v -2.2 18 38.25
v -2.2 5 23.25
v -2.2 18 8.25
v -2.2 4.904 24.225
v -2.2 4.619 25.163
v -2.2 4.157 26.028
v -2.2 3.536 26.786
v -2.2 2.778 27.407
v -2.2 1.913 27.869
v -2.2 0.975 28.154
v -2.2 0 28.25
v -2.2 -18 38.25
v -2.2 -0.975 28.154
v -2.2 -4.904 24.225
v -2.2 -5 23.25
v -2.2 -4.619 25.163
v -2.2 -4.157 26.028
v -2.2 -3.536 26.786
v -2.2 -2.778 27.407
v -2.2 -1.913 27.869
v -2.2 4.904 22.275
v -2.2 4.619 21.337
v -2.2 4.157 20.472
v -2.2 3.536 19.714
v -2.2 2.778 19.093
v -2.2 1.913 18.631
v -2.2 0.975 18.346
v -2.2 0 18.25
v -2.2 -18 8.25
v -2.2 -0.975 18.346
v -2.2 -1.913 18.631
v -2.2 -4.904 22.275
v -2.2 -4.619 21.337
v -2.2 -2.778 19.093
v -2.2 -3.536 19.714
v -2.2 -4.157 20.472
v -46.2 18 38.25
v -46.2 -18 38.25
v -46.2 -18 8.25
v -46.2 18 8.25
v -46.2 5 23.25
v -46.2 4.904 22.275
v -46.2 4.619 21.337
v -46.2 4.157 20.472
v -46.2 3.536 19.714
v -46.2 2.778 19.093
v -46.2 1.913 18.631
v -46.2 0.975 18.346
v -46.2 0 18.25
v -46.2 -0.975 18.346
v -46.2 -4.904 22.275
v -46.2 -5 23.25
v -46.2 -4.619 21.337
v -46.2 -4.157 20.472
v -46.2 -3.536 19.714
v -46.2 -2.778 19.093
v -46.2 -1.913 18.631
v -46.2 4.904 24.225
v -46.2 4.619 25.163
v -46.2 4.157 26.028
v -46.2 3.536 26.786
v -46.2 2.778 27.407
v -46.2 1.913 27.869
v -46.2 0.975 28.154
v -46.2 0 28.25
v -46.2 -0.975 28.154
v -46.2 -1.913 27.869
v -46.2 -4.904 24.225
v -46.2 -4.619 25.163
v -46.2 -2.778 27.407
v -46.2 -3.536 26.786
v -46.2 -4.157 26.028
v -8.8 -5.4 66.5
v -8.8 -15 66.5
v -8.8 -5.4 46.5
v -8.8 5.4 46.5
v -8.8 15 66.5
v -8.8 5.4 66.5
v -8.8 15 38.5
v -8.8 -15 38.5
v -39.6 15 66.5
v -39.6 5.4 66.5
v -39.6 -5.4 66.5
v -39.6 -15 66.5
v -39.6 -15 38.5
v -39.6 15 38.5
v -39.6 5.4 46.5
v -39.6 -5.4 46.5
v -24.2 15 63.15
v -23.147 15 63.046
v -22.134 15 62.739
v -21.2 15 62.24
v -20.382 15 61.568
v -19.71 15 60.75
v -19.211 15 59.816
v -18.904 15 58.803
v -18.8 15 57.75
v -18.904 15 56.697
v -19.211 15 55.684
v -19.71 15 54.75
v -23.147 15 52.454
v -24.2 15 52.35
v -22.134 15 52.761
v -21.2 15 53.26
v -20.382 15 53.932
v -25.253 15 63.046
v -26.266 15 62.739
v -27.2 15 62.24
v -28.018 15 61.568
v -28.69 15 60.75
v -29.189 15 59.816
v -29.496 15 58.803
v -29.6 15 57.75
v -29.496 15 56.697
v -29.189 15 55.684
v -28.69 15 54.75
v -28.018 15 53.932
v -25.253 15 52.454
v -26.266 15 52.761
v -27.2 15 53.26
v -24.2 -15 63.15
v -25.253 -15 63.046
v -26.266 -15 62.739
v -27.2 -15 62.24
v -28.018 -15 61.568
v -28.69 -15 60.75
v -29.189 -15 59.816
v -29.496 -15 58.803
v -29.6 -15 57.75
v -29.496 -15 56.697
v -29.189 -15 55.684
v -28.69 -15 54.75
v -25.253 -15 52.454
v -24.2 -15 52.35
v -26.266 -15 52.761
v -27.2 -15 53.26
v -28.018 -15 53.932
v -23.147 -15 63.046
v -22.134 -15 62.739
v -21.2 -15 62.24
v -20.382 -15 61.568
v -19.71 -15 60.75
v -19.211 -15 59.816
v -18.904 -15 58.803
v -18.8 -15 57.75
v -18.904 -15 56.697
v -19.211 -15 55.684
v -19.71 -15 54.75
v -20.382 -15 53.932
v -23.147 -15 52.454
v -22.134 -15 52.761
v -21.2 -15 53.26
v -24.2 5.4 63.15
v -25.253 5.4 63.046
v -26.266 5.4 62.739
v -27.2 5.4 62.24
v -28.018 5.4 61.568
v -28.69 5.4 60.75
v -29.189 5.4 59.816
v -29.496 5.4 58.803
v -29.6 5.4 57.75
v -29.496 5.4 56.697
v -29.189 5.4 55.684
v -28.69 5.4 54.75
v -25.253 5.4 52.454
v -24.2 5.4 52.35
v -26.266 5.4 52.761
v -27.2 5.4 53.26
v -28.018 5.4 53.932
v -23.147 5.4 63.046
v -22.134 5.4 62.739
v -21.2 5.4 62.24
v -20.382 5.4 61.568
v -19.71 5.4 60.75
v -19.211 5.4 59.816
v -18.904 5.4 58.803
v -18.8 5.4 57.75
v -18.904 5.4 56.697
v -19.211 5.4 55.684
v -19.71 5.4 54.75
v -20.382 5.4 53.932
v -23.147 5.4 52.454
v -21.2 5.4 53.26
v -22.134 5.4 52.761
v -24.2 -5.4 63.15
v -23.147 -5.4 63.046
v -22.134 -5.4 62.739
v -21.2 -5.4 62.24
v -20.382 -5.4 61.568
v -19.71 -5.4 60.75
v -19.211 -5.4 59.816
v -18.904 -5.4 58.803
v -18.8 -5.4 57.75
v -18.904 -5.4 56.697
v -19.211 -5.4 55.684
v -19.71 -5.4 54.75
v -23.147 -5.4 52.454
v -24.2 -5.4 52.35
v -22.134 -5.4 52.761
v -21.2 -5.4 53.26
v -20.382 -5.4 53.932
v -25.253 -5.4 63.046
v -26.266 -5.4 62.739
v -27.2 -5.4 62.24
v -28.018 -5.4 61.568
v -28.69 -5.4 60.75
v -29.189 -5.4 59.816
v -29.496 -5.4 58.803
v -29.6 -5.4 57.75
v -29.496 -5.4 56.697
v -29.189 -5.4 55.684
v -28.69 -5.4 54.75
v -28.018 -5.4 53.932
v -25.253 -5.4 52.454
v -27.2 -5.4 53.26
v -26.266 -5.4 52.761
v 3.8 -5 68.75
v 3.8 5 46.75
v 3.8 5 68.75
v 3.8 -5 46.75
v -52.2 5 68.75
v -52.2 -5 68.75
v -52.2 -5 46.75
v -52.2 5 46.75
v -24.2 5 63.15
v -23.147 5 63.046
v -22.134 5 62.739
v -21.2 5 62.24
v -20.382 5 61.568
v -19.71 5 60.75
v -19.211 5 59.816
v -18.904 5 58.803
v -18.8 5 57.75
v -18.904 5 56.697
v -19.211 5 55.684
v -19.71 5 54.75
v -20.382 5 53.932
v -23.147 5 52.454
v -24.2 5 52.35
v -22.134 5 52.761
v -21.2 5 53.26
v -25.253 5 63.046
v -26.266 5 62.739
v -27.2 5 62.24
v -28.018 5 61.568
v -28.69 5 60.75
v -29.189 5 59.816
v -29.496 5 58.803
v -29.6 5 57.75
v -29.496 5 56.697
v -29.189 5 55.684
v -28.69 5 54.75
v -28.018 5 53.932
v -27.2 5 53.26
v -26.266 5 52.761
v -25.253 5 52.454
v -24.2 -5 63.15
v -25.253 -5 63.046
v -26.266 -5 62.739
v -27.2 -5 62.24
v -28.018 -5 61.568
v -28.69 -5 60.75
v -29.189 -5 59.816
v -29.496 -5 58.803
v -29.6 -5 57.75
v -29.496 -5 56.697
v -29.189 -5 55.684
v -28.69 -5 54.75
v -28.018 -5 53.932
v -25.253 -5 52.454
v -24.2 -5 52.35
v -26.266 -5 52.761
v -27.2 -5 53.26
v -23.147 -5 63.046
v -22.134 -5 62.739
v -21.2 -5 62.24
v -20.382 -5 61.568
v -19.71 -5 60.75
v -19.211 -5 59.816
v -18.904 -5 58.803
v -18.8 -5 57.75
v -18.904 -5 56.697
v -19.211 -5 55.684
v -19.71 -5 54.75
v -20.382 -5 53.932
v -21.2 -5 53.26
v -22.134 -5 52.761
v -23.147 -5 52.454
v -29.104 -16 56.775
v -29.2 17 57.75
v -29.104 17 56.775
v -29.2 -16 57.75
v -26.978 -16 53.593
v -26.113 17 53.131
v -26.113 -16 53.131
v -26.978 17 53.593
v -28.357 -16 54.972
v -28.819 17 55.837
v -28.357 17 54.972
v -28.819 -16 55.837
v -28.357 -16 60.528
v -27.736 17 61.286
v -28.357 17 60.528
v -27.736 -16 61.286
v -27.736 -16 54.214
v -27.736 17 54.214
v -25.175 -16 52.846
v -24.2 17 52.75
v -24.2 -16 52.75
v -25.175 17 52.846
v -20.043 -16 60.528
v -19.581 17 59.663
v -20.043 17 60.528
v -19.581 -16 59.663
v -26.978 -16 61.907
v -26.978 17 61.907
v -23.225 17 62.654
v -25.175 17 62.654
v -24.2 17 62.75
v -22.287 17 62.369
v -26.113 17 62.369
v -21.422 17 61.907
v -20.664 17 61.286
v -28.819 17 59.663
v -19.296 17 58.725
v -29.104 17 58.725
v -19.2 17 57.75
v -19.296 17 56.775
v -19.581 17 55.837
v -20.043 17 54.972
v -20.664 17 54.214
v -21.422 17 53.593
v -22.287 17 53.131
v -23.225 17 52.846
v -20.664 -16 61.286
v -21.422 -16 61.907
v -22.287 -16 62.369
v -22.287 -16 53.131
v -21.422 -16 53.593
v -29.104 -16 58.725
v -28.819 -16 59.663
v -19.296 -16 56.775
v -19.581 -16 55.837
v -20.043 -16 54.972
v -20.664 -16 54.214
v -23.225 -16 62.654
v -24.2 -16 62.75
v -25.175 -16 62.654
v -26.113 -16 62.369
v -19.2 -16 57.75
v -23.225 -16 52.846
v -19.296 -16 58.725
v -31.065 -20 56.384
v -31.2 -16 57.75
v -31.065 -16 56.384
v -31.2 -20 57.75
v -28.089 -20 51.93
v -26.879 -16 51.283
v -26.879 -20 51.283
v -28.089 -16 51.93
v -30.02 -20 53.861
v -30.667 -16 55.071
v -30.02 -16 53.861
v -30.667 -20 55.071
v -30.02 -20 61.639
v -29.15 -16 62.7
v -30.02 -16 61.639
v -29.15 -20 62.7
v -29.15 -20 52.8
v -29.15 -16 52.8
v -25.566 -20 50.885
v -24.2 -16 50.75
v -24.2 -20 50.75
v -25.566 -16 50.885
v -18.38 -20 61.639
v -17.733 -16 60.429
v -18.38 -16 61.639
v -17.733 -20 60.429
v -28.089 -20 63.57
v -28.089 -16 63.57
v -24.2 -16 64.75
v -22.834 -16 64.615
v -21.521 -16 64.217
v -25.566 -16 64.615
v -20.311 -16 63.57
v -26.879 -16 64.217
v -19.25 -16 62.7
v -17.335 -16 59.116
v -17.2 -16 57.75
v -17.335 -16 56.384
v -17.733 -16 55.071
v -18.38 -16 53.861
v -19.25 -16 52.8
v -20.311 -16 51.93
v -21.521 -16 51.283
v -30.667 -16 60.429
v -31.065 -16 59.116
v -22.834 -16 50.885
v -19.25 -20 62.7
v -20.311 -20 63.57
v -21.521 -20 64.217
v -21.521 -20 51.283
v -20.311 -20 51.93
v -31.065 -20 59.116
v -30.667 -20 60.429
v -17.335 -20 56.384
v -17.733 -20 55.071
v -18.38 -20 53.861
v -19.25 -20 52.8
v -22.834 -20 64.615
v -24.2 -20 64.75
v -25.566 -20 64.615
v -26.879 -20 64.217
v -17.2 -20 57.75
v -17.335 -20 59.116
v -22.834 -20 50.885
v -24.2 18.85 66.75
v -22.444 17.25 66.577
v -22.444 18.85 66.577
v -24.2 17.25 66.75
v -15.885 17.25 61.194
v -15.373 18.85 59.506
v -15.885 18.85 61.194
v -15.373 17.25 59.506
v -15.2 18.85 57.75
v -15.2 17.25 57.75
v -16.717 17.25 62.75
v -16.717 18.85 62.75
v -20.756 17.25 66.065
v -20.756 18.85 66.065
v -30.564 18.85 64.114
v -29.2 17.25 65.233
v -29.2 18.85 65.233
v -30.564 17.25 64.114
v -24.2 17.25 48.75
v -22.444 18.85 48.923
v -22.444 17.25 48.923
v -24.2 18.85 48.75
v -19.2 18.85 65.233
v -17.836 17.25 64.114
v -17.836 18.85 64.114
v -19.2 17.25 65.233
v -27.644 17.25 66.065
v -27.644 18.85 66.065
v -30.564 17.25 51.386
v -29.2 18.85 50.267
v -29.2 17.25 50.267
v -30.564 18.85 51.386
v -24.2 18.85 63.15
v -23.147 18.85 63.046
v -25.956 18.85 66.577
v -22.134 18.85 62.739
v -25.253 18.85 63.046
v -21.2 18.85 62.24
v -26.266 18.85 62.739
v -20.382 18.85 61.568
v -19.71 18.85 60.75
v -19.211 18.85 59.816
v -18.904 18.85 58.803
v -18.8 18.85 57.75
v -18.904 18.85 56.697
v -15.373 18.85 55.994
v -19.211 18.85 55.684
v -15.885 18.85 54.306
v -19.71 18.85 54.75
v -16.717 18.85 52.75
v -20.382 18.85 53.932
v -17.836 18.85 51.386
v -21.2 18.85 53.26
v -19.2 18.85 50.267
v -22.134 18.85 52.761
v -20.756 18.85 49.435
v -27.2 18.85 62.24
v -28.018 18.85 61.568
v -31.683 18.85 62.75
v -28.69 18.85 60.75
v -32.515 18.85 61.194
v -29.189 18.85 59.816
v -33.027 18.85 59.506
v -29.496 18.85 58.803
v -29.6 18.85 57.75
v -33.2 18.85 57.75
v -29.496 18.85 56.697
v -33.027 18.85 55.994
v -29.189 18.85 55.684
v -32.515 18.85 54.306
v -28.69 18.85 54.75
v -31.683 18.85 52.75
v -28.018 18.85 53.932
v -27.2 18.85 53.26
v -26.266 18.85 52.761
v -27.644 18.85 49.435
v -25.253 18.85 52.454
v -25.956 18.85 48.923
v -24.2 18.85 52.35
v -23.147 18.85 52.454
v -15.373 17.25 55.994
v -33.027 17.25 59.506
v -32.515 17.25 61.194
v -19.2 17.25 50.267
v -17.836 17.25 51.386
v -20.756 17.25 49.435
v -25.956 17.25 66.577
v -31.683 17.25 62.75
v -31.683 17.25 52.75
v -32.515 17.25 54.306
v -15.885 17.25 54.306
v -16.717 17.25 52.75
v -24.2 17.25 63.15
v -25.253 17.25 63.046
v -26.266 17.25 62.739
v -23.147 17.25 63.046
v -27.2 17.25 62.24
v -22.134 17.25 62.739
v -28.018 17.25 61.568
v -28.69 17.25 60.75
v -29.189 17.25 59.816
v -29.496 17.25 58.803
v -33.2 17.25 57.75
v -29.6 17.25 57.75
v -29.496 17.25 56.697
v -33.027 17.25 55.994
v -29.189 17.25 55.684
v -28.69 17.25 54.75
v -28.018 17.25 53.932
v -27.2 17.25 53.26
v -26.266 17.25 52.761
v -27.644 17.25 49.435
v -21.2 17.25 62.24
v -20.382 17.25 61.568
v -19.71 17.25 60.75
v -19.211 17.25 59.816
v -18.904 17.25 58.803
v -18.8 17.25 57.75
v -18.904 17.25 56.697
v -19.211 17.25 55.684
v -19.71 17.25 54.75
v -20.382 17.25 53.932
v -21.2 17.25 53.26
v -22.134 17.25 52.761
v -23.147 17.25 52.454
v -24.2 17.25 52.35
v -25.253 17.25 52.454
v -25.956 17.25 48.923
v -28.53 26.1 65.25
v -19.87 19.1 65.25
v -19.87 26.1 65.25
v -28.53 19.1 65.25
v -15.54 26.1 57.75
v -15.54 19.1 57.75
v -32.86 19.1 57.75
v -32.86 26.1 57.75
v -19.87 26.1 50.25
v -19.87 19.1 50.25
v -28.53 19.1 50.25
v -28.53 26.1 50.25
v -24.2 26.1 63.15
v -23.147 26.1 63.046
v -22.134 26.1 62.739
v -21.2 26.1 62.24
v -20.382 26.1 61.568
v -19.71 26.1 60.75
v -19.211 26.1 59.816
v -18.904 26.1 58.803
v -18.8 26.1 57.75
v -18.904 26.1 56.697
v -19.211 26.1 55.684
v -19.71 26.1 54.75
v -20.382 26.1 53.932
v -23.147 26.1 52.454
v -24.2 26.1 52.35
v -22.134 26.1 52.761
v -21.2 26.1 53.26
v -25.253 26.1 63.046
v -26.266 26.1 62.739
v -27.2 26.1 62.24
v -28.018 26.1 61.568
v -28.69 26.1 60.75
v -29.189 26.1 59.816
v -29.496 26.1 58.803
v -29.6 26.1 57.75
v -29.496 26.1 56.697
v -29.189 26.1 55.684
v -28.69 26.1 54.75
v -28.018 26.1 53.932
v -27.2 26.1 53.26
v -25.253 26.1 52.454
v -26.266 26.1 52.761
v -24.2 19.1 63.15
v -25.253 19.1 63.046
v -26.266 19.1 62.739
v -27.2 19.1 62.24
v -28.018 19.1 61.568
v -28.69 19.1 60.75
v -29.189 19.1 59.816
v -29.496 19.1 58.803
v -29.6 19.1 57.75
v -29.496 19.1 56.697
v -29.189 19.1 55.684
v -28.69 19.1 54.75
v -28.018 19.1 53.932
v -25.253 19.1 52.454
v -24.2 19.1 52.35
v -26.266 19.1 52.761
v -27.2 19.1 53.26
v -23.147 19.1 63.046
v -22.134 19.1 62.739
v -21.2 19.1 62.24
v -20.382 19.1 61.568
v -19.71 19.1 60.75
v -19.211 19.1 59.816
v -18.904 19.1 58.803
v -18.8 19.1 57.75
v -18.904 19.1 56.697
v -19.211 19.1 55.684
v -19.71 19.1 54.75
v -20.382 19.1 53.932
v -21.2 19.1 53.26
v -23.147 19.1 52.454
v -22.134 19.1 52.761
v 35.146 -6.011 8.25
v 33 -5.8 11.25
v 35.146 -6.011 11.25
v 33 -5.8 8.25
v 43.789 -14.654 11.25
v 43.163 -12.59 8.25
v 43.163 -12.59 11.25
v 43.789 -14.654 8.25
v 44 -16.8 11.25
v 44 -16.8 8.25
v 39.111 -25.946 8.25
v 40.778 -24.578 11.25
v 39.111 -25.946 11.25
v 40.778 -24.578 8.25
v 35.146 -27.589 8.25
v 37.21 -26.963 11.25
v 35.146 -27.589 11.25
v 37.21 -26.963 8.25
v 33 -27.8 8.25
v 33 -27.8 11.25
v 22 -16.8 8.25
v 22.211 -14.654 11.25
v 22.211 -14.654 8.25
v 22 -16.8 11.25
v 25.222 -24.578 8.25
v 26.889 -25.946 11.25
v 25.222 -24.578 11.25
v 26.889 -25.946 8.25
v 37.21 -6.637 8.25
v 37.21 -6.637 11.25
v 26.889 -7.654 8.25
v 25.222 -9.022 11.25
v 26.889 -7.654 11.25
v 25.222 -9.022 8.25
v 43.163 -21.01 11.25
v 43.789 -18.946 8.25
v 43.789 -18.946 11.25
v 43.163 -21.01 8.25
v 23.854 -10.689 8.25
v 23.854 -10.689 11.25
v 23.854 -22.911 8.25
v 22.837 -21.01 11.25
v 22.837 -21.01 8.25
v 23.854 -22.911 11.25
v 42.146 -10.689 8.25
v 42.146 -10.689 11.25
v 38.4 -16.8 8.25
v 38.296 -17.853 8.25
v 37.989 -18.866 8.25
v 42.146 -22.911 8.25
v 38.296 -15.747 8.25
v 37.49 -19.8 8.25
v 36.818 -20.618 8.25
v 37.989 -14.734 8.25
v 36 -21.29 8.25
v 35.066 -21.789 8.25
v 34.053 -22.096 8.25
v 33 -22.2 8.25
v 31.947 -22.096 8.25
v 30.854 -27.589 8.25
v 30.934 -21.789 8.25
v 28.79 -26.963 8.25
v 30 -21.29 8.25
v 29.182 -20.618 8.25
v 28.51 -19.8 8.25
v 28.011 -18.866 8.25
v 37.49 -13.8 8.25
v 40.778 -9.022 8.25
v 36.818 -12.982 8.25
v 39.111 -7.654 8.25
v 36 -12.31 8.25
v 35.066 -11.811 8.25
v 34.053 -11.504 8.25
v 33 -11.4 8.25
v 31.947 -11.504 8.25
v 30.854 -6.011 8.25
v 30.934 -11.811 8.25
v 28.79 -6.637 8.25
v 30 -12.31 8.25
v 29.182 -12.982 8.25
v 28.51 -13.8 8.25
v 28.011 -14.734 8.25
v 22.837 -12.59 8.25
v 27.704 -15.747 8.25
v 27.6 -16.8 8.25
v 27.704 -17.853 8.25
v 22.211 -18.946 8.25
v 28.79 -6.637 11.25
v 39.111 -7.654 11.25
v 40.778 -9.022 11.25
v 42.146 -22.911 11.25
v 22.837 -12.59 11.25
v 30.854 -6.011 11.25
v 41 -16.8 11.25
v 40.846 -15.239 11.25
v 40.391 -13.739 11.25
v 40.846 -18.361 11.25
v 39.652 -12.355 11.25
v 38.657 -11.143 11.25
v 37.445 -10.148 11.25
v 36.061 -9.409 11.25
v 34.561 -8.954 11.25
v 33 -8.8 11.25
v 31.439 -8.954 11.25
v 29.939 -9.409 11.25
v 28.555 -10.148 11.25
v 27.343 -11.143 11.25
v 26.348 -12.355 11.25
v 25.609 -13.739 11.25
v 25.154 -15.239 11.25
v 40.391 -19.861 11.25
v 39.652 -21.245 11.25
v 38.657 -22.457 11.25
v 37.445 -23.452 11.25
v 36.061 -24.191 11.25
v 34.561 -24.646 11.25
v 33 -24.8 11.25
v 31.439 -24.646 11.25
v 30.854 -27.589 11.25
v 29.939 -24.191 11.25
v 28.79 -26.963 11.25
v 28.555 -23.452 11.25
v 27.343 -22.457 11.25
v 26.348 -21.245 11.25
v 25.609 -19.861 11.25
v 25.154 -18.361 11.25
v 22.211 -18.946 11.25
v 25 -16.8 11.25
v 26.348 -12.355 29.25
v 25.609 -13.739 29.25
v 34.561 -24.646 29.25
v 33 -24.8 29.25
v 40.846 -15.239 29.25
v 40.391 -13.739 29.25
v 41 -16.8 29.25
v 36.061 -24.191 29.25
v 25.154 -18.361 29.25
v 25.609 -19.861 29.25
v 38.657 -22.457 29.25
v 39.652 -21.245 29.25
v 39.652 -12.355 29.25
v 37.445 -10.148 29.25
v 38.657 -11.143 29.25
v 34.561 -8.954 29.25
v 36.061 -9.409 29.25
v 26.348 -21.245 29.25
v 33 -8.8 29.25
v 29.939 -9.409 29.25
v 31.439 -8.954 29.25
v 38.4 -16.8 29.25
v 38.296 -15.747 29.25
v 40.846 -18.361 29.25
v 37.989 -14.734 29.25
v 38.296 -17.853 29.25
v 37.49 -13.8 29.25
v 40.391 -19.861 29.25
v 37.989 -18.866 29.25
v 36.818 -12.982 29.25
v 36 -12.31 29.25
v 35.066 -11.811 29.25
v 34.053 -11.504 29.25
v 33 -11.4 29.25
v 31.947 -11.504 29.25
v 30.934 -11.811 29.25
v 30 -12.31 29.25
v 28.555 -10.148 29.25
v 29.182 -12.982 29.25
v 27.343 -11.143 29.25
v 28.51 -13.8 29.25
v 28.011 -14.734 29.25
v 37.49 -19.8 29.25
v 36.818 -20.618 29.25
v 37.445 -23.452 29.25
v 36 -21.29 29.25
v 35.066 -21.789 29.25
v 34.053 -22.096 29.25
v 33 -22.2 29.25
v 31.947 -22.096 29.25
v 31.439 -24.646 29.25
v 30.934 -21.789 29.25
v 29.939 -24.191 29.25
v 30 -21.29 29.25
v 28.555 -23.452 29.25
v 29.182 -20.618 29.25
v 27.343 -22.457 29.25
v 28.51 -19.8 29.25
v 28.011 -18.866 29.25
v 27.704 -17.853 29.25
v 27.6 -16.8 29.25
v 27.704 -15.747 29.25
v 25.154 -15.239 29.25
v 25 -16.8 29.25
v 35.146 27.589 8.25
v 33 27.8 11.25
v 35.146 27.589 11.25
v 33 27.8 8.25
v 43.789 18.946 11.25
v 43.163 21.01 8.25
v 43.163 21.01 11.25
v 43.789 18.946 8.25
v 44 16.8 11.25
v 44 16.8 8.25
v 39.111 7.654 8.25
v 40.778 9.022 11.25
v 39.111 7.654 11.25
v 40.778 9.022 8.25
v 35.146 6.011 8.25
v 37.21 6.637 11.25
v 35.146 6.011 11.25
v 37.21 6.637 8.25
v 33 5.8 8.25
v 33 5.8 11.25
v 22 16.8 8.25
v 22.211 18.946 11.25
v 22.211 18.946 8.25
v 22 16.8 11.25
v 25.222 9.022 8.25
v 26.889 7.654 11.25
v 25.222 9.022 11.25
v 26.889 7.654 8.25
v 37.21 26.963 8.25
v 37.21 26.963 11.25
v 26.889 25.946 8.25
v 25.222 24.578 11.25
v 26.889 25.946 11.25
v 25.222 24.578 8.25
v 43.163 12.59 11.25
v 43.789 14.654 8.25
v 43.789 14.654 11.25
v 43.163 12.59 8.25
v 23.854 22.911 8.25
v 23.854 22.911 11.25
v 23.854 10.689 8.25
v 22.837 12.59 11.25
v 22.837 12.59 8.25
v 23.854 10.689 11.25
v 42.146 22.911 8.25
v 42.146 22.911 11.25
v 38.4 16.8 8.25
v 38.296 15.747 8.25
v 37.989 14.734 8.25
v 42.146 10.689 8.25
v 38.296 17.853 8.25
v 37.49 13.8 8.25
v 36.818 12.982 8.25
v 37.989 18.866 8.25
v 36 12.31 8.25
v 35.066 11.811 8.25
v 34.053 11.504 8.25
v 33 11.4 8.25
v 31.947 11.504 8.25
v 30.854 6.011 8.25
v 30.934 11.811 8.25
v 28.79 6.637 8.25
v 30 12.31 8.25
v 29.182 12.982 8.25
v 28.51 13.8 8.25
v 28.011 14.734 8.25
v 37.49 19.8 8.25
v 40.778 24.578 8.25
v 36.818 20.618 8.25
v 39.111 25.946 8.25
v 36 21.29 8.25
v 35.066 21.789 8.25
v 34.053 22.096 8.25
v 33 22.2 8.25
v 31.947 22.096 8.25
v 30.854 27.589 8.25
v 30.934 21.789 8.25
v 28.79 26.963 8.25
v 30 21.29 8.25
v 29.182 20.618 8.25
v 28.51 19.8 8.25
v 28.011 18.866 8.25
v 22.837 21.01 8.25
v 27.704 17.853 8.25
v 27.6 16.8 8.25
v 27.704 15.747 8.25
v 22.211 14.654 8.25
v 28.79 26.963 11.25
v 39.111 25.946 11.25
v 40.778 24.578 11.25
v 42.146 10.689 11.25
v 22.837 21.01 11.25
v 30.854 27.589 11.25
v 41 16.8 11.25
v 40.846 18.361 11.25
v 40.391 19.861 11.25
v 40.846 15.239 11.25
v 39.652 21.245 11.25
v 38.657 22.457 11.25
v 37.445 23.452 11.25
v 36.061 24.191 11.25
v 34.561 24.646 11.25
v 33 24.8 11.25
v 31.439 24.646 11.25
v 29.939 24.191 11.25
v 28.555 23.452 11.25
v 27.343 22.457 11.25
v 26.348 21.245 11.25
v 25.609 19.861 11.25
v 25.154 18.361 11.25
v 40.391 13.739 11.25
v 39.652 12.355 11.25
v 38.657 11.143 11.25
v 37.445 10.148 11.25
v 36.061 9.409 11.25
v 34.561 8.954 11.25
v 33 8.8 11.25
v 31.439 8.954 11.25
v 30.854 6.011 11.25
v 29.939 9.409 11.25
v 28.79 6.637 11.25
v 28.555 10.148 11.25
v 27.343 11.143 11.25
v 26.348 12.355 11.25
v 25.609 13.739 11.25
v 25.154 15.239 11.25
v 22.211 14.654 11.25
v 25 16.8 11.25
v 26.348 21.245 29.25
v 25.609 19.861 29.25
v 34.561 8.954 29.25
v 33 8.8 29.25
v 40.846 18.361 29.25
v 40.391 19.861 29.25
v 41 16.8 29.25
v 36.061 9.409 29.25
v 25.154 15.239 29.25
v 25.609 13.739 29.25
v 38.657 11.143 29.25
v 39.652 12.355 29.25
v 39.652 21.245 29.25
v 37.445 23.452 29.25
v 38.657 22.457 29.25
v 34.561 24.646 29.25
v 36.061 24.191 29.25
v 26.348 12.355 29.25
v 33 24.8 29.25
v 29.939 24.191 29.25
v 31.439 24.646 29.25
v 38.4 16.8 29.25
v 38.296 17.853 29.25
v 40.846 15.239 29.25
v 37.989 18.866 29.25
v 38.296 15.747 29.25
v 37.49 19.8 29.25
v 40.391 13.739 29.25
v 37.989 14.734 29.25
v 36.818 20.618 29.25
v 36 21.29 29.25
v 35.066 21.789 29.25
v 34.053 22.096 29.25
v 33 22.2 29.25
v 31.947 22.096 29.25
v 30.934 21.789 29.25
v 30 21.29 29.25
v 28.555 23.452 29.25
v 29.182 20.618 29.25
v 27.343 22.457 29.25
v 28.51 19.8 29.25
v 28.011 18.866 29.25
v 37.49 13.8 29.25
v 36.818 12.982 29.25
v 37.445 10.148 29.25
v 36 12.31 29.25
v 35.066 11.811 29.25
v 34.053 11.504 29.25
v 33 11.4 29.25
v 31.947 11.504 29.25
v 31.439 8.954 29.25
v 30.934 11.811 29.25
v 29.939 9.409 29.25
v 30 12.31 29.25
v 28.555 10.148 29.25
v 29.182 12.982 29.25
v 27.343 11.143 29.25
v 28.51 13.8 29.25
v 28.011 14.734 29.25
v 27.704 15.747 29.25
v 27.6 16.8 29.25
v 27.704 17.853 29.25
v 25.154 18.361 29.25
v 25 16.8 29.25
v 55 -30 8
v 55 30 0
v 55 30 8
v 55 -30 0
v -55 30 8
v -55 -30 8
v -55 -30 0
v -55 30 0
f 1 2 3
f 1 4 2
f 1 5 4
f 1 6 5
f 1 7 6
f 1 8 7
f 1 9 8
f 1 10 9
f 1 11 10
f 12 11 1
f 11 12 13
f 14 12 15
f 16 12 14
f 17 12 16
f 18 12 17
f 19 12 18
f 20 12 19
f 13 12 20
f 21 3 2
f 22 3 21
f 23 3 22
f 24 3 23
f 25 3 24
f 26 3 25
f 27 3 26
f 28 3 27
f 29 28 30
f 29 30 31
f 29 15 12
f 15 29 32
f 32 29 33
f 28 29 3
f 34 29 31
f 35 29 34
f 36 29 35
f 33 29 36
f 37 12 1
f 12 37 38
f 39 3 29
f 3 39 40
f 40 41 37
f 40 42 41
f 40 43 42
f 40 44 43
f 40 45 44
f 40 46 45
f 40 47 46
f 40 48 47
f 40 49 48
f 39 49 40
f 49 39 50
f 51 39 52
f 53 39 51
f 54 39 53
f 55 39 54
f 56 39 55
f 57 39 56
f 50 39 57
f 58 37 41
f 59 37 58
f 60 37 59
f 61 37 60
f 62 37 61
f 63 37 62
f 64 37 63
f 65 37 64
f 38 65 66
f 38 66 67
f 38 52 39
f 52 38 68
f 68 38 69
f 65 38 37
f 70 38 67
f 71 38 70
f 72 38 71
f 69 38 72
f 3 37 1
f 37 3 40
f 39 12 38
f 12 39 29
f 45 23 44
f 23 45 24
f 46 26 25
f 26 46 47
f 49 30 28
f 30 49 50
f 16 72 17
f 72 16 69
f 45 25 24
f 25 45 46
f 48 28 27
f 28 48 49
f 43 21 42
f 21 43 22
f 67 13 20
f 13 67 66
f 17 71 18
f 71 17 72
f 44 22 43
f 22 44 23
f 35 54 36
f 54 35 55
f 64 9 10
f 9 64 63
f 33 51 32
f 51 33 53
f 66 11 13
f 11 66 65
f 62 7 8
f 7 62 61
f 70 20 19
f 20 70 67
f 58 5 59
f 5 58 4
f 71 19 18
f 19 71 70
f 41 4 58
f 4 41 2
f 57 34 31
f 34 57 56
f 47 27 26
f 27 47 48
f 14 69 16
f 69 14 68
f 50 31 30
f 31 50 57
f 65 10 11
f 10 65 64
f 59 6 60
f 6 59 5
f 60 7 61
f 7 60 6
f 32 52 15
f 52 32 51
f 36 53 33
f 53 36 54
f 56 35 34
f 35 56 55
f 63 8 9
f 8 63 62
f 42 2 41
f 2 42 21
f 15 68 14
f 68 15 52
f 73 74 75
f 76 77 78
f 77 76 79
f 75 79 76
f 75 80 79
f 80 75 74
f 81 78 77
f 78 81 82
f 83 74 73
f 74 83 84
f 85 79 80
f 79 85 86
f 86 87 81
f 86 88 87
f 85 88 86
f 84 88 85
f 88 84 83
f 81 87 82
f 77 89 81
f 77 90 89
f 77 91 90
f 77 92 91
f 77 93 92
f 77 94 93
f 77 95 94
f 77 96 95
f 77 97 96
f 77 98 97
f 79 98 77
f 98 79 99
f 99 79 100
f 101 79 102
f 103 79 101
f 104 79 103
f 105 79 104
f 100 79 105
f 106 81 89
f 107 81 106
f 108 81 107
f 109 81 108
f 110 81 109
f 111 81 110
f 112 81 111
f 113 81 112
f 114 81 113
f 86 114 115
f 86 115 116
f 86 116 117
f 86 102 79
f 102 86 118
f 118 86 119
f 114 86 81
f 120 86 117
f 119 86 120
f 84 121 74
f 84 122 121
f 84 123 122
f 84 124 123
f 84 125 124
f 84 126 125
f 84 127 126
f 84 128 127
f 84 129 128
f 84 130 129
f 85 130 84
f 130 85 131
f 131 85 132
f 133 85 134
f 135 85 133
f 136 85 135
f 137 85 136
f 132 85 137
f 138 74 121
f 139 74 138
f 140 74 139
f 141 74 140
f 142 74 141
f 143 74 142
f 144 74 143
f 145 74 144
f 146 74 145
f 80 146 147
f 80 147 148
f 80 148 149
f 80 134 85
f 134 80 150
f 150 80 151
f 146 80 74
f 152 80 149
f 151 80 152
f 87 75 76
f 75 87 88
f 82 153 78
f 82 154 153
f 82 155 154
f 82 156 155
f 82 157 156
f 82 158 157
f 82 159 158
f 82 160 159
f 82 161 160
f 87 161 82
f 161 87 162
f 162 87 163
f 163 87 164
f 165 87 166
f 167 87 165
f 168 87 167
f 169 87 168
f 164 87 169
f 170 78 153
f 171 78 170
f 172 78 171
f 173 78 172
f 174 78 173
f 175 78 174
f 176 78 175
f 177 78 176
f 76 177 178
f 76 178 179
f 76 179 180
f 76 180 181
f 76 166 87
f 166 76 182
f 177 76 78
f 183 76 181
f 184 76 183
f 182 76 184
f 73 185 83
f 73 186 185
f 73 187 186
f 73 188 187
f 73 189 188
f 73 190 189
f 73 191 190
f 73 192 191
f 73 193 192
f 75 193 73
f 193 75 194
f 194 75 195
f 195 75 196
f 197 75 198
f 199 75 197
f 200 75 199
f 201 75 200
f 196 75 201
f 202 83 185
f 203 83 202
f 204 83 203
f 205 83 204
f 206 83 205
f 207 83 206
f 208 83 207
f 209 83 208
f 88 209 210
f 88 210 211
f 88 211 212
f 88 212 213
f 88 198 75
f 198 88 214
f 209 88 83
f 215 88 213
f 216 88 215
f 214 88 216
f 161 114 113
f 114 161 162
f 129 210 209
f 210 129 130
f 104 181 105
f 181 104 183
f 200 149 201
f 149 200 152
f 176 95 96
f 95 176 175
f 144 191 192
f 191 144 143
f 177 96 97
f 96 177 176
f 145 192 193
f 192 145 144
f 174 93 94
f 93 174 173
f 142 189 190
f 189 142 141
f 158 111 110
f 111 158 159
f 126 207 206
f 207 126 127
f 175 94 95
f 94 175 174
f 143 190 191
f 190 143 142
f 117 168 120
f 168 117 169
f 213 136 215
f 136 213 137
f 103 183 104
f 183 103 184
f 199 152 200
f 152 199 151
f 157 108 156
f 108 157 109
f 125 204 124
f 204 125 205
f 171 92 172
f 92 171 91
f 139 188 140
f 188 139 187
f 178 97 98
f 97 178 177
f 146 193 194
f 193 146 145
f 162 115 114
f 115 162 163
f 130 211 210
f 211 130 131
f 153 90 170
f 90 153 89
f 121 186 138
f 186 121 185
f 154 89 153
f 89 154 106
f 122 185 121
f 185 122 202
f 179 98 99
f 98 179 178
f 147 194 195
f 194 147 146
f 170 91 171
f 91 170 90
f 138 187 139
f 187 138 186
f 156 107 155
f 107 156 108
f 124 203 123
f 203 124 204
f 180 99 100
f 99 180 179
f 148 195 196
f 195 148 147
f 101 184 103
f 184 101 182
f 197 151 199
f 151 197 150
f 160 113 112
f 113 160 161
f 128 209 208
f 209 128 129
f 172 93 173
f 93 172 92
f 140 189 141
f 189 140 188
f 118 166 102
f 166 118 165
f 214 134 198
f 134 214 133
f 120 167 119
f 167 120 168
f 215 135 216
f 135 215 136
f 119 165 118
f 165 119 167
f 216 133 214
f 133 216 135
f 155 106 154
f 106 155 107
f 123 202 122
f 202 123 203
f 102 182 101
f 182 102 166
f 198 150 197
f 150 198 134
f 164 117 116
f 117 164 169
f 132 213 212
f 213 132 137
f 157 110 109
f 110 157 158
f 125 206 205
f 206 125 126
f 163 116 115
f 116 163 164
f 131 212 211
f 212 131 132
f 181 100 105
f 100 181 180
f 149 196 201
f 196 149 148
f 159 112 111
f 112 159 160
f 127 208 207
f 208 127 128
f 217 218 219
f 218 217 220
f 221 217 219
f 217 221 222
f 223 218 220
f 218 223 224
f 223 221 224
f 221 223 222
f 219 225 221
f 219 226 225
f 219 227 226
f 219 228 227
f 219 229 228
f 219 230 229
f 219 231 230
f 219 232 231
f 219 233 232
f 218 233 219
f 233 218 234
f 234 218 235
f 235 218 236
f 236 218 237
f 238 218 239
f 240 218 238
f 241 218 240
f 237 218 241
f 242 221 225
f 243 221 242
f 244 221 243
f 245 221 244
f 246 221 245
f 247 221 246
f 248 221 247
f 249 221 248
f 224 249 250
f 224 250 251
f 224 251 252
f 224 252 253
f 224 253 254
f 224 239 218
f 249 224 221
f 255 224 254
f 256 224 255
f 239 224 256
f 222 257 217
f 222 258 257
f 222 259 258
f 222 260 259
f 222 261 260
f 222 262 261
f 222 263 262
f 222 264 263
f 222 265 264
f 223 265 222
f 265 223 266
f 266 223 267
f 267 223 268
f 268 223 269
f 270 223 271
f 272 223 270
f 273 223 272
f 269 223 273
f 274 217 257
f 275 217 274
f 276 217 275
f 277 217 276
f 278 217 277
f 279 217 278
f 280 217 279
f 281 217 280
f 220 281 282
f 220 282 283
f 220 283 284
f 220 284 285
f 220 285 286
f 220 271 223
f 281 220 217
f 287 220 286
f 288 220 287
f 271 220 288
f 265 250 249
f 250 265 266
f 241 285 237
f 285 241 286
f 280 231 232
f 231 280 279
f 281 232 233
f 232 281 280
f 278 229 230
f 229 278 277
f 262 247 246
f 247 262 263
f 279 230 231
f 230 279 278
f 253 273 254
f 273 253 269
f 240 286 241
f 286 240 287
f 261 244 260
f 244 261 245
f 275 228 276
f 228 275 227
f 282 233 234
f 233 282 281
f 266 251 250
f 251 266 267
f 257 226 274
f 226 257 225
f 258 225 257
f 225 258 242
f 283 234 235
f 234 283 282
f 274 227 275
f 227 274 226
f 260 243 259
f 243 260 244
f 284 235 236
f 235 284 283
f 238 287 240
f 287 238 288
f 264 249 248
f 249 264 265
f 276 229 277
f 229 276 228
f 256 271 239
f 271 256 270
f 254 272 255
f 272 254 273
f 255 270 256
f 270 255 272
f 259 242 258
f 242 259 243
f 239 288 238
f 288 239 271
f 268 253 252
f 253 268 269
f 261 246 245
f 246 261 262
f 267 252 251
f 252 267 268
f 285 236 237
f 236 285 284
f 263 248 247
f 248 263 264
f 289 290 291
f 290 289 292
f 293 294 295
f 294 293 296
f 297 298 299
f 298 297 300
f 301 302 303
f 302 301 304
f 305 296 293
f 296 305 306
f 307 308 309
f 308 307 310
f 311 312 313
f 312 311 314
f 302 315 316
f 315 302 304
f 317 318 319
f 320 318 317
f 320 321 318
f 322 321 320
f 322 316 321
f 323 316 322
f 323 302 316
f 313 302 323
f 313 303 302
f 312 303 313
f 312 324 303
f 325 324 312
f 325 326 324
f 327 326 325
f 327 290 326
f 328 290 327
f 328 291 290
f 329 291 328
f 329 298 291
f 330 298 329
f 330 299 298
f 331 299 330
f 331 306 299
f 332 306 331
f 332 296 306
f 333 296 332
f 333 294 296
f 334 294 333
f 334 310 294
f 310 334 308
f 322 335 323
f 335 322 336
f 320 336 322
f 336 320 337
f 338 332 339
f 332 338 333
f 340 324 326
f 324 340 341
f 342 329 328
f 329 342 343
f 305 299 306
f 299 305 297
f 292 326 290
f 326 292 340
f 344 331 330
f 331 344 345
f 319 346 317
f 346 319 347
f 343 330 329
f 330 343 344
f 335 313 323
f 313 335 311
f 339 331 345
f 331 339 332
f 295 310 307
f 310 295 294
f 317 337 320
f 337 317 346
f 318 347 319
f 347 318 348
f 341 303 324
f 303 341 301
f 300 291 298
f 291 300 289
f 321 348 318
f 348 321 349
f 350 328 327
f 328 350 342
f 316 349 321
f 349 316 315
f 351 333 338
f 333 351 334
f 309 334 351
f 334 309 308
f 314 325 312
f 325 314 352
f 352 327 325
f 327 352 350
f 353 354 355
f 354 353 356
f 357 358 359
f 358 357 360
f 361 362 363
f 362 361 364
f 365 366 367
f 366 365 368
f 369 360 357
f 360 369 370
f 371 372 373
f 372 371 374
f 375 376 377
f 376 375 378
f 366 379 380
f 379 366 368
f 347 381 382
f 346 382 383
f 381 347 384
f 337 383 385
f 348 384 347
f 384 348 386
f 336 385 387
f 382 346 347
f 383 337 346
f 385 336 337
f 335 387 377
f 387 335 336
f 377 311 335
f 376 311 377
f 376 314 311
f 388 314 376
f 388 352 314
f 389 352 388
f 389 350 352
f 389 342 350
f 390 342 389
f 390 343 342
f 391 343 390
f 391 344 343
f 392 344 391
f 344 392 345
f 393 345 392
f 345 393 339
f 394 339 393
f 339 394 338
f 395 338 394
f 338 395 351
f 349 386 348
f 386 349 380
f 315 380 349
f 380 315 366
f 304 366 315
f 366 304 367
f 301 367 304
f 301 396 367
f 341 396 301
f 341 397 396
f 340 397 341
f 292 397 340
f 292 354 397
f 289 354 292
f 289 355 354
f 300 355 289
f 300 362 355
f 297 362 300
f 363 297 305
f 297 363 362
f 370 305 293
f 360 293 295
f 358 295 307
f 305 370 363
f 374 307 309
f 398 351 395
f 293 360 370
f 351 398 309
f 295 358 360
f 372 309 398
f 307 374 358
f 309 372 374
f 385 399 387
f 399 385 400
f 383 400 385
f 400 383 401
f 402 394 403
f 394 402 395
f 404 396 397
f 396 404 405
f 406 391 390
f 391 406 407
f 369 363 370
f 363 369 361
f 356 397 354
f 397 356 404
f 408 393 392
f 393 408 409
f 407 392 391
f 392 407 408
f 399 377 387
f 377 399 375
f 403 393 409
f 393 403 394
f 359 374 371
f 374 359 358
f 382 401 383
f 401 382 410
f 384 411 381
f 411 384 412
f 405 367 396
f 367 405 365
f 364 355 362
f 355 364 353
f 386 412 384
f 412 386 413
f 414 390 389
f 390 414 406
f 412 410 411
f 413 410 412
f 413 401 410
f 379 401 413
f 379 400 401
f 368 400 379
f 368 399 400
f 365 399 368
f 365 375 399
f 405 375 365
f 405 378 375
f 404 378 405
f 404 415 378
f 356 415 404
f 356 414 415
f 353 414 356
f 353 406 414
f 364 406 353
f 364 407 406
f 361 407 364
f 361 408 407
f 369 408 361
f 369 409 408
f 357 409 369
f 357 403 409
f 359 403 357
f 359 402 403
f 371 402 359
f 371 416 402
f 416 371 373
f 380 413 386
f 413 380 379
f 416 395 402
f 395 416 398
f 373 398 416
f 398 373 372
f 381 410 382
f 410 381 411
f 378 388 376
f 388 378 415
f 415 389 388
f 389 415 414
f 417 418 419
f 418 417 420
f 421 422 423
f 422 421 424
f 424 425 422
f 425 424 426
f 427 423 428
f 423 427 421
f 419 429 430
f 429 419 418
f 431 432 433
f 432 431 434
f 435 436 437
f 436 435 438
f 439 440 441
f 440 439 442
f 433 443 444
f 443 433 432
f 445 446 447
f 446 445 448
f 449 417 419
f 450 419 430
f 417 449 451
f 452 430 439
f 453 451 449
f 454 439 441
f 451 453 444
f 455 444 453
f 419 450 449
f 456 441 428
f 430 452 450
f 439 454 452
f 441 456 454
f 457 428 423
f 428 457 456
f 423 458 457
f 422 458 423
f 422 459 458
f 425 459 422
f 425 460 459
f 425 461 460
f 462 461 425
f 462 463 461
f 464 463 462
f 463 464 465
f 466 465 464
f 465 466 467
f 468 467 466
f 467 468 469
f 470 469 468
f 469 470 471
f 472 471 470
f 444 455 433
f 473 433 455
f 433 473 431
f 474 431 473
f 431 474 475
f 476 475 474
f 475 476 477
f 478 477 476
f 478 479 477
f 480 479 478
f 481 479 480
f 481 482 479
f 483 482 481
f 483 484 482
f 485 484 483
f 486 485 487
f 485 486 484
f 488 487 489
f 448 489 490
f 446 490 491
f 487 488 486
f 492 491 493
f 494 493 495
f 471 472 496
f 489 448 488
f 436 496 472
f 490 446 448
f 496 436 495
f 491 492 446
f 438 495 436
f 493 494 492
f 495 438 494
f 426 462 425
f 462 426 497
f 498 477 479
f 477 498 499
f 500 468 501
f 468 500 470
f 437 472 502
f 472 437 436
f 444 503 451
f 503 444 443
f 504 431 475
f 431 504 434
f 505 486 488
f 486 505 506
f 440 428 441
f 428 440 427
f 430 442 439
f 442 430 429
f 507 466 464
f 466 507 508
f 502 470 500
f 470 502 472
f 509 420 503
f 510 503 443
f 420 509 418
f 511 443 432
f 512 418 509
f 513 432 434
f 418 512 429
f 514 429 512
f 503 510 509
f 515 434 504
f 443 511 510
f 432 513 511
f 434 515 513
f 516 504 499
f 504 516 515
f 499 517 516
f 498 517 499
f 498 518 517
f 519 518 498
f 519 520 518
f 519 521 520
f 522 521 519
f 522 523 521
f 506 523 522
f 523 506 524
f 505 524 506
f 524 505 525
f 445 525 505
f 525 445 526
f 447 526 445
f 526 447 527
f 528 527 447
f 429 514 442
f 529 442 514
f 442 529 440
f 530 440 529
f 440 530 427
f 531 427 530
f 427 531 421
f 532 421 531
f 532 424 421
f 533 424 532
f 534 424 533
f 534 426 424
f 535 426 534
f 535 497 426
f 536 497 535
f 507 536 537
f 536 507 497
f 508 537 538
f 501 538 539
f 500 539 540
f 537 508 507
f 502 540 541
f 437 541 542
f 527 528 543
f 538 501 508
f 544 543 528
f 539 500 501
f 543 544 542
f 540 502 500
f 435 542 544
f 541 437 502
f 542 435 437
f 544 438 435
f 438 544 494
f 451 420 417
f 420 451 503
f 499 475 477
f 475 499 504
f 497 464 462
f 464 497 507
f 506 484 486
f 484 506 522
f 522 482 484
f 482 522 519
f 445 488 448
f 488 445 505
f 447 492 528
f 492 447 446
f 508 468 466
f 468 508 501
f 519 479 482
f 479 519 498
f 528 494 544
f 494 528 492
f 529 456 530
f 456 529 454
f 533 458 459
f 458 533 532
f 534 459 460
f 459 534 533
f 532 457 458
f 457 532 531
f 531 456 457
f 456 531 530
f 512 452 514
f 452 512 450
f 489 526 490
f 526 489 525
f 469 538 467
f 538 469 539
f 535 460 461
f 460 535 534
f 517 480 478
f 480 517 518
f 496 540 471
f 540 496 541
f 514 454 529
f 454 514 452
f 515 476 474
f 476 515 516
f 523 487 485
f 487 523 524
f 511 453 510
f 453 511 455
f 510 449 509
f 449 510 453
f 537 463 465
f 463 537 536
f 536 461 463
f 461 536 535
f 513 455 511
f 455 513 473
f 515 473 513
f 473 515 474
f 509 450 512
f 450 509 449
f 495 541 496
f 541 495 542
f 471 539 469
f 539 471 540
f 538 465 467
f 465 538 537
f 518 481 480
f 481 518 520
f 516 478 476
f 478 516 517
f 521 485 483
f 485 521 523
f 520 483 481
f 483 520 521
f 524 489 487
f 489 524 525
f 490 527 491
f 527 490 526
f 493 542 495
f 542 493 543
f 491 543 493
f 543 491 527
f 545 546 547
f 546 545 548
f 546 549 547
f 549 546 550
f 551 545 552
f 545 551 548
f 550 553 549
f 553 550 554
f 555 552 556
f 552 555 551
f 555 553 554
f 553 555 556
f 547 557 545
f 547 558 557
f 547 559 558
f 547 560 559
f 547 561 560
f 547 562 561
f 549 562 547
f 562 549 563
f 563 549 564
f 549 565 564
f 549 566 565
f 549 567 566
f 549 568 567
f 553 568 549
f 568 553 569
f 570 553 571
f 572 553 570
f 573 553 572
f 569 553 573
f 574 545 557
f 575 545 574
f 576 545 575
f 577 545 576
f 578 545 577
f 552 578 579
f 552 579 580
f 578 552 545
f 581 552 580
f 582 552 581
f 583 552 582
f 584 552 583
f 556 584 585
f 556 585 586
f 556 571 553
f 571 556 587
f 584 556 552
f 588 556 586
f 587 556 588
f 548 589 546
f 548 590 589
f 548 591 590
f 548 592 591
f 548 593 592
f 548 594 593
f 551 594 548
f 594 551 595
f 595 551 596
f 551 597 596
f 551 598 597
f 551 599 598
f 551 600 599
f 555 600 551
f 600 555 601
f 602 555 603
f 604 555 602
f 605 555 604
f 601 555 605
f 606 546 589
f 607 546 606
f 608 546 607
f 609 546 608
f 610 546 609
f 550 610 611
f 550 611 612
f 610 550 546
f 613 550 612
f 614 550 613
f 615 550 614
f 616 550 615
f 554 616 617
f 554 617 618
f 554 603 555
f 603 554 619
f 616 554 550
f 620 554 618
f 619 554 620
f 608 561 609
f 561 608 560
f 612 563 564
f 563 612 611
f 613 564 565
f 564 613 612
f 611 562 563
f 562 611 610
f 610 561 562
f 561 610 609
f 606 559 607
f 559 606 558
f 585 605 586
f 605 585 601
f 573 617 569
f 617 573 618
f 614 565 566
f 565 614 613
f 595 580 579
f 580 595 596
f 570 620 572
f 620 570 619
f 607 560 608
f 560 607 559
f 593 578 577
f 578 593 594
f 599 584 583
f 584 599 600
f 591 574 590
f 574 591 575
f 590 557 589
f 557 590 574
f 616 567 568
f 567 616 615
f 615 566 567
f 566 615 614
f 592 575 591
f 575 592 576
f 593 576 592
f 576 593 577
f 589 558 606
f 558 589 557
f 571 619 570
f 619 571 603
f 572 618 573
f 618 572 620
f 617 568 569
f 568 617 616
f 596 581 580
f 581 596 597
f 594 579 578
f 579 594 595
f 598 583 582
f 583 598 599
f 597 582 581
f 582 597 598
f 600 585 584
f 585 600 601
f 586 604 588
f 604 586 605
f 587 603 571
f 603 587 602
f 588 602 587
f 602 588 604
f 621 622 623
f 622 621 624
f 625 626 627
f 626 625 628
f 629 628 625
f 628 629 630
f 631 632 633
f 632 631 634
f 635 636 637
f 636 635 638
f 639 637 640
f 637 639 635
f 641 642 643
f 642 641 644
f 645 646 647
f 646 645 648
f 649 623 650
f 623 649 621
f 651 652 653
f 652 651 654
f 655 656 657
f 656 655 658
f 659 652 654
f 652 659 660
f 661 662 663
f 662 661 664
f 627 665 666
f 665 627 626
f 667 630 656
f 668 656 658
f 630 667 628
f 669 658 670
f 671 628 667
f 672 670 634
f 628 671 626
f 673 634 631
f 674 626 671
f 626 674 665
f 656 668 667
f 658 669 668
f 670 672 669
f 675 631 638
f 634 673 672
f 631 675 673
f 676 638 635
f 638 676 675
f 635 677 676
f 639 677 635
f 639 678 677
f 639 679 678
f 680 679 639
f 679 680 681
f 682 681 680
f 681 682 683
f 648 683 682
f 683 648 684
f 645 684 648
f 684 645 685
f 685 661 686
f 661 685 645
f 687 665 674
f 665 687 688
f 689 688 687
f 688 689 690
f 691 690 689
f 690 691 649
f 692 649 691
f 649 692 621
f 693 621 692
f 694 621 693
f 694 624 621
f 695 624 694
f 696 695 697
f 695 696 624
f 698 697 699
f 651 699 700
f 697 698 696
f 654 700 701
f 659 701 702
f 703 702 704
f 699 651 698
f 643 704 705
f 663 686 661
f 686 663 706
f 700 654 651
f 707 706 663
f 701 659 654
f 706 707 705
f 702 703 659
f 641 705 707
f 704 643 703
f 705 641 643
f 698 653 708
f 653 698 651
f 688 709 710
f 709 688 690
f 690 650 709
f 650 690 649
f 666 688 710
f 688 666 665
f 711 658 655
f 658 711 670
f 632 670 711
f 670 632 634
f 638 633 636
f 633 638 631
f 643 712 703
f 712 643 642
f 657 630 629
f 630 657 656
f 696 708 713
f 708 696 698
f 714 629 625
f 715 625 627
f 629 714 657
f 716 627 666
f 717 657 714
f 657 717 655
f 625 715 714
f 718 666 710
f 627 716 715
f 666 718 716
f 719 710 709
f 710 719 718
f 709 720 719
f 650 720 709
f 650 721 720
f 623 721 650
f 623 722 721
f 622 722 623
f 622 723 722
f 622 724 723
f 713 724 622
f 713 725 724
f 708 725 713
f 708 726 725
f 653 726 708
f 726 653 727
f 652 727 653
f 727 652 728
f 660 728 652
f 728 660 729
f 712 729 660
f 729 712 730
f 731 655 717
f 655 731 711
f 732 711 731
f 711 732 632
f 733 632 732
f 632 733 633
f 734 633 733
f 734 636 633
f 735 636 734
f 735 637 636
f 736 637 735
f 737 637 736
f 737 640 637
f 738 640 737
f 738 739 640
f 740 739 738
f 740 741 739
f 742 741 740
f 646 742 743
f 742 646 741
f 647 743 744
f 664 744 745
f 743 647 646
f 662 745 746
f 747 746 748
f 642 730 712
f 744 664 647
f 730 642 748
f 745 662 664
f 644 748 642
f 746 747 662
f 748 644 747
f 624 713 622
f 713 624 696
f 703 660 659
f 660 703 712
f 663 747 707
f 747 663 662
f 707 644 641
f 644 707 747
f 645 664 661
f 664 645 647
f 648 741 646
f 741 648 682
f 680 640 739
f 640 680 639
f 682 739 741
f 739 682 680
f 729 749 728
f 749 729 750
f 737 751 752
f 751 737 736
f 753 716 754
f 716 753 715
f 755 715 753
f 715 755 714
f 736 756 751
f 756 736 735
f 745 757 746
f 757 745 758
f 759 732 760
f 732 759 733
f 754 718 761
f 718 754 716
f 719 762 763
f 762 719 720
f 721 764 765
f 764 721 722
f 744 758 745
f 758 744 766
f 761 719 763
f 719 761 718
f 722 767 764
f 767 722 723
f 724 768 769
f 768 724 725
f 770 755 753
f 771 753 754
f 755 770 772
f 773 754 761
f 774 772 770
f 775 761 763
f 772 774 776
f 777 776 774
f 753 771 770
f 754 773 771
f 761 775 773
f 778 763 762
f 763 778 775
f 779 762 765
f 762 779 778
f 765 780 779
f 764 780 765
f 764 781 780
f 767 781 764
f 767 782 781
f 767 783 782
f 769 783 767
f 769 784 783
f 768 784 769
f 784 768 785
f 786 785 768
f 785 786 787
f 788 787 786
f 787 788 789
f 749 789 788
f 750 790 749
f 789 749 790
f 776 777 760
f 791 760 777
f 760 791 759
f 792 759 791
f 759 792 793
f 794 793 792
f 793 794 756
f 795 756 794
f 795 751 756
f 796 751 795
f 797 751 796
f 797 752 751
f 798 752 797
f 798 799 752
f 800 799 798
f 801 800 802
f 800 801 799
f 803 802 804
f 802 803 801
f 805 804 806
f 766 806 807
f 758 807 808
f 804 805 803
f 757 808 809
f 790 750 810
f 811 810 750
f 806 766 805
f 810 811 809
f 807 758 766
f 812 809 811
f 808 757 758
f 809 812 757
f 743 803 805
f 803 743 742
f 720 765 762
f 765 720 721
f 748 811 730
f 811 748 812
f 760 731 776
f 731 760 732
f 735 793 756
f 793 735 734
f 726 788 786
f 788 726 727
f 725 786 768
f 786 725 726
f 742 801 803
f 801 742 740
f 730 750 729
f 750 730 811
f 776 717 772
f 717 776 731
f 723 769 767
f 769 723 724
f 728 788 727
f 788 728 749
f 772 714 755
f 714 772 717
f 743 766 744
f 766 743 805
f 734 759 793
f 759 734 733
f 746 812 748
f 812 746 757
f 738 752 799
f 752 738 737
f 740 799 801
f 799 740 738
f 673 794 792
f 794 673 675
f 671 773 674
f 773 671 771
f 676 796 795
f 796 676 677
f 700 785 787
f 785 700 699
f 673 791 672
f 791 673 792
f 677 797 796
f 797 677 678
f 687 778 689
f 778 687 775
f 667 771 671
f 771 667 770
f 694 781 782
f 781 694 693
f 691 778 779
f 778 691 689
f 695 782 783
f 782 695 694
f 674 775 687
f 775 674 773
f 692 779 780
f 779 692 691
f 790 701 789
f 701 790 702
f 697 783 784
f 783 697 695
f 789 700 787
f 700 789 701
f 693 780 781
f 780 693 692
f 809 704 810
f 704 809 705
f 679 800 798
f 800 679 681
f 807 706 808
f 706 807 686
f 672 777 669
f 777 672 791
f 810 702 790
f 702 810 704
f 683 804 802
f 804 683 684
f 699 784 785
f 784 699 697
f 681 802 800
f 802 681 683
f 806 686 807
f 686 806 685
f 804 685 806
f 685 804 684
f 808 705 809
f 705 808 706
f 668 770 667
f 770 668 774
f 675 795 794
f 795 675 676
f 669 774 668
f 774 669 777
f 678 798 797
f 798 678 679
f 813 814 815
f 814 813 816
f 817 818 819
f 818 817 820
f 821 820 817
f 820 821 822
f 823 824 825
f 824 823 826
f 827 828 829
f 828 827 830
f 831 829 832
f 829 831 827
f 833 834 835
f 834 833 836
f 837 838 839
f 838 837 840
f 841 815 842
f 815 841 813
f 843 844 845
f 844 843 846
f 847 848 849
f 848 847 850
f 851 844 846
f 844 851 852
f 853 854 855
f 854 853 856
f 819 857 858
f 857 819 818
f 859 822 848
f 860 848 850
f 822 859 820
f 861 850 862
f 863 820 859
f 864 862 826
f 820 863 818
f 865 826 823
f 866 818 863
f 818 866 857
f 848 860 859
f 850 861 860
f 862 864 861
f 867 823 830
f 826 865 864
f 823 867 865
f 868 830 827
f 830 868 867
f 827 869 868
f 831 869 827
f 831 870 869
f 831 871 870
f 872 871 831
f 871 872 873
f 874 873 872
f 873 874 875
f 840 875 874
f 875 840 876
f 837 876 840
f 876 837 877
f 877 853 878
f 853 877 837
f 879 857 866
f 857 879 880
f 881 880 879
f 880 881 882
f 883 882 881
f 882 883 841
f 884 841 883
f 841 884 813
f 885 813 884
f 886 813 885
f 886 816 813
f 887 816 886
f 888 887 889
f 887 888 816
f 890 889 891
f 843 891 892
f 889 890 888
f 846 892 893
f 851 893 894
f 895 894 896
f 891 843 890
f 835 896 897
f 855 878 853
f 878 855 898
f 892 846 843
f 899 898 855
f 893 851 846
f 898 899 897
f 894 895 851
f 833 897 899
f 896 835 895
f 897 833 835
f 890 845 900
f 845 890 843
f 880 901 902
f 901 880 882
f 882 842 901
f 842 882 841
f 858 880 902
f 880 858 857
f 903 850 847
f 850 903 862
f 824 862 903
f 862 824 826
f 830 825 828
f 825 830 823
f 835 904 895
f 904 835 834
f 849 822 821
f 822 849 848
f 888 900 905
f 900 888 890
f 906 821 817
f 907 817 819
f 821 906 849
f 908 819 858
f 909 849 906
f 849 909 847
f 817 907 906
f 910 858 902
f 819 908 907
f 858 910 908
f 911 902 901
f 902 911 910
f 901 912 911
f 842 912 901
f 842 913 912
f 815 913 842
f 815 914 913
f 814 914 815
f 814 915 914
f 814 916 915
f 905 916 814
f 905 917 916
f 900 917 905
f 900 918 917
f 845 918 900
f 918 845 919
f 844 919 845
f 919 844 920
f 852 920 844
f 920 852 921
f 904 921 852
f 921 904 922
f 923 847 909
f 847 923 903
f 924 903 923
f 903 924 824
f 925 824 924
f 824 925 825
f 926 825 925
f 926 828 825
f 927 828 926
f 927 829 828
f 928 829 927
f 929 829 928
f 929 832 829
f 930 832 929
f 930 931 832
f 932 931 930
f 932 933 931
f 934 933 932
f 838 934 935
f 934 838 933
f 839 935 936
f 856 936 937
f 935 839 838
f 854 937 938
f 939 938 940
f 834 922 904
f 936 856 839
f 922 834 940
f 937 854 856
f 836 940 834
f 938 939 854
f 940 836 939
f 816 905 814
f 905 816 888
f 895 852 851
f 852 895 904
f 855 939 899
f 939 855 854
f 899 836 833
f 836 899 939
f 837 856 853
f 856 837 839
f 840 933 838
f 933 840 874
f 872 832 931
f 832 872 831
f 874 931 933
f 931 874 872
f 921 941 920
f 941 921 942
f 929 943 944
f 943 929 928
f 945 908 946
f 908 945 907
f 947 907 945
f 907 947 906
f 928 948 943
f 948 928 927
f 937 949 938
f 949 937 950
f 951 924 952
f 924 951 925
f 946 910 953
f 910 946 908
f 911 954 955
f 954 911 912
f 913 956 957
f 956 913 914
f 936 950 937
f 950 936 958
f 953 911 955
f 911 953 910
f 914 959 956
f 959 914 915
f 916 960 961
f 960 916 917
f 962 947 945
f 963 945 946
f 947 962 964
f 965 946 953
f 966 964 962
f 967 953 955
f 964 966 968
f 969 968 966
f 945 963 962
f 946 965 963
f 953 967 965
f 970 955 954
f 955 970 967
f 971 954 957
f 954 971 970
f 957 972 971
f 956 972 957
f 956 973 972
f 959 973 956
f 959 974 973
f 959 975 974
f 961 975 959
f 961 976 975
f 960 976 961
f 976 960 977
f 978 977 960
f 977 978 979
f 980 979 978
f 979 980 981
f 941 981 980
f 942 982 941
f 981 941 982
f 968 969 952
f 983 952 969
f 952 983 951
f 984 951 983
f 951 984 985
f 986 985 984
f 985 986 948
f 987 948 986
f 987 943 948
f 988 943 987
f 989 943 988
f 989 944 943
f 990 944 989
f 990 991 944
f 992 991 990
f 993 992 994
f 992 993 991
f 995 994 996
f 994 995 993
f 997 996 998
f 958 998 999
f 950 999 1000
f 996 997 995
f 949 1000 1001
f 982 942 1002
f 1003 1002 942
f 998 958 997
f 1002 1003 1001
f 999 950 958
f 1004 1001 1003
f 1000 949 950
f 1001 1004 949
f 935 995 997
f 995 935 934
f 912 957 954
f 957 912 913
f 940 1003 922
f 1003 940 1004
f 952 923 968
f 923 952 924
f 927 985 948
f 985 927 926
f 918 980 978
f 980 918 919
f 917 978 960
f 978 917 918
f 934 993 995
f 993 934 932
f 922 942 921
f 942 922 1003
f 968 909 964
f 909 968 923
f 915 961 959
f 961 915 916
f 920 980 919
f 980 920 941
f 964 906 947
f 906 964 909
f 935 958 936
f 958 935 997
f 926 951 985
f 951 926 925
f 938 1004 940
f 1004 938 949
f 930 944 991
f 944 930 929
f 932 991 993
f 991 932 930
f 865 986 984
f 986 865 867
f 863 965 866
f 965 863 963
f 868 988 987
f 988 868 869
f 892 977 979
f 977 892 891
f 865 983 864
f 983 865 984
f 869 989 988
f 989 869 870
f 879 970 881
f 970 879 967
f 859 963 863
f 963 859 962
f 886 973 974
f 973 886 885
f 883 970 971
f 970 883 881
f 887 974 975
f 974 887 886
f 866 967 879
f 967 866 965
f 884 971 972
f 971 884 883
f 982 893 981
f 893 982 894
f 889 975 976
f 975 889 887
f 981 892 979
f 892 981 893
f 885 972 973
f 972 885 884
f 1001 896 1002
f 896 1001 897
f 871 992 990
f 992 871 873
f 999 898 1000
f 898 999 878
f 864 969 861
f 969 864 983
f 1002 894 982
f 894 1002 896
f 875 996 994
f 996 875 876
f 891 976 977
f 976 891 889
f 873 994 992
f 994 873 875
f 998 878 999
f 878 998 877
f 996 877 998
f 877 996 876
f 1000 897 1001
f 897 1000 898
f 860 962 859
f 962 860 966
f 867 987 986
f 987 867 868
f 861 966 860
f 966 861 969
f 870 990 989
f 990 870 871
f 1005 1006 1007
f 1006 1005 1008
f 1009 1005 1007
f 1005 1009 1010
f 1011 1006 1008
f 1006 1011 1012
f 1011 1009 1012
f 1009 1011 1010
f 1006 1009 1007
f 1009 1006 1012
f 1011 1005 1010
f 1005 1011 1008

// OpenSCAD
$fn = 32;

// ------------------------------------------------------------------------
// Indexing jig: plate 110 x 60 mm, pin d10
// Every part is its own module, assembly() places every instance.
// ------------------------------------------------------------------------

// --- part 1 ---
module jig_plate() {
  difference() {
    translate([-55, -30, 0]) cube([110, 60, 8]);
  }
}

// --- part 2 ---
module locator_block() {
  difference() {
    translate([-22, -18, 0]) cube([44, 36, 30]);
    translate([0, 0, 15]) rotate([0, 90, 0]) cylinder(h = 46, d = 10, center = true);
  }
}

// --- part 3 ---
module index_fork() {
  difference() {
    translate([-15.4, -15, 0]) cube([30.8, 30, 28]);
    translate([-16.4, -5.4, 8]) cube([32.8, 10.8, 21]);
    translate([0, 0, 19.25]) rotate([90, 0, 0]) cylinder(h = 32, d = 10.8, center = true);
  }
}

// --- part 4 ---
module index_arm() {
  difference() {
    translate([-28, -5, 0]) cube([56, 10, 22]);
    translate([0, 0, 11]) rotate([90, 0, 0]) cylinder(h = 12, d = 10.8, center = true);
  }
}

// --- part 5 ---
module index_pin() {
  rotate([0, 90, 0]) cylinder(h = 34, d = 10, center = true);
  translate([-20, 0, 0]) rotate([0, 90, 0]) cylinder(h = 4, d = 14);
}

// --- part 6 ---
module pin_washer() {
  difference() {
      translate([0, 0, 0]) cylinder(h = 1.6, d = 18);
      translate([0, 0, -1]) cylinder(h = 3.6, d = 10.8);
    }
}

// --- part 7 ---
module lock_nut() {
  difference() {
    linear_extrude(height = 7) polygon(points = [[8.66, 0], [4.33, 7.5], [-4.33, 7.5], [-8.66, 0], [-4.33, -7.5], [4.33, -7.5]]);
    translate([0, 0, -1]) cylinder(h = 9, d = 10.8);
  }
}

// --- part 8 ---
module guide_bush_a() {
  difference() {
    union() {
      cylinder(h = 3, d = 22);
      translate([0, 0, 3]) cylinder(h = 18, d = 16);
    }
    translate([0, 0, -1]) cylinder(h = 23, d = 10.8);
  }
}

// --- part 9 ---
module guide_bush_b() {
  difference() {
    union() {
      cylinder(h = 3, d = 22);
      translate([0, 0, 3]) cylinder(h = 18, d = 16);
    }
    translate([0, 0, -1]) cylinder(h = 23, d = 10.8);
  }
}

// --- assembly ---
module assembly() {
  color([0.80, 0.24, 0.20]) translate([0, 0, 0]) rotate([0, 0, 0]) jig_plate();
  color([0.20, 0.45, 0.75]) translate([-24.2, 0, 8.25]) rotate([0, 0, 0]) locator_block();
  color([0.25, 0.62, 0.32]) translate([-24.2, 0, 38.5]) rotate([0, 0, 0]) index_fork();
  color([0.92, 0.70, 0.18]) translate([-24.2, 0, 46.75]) rotate([0, 0, 0]) index_arm();
  color([0.58, 0.35, 0.70]) translate([-24.2, 0, 57.75]) rotate([0, 0, 90]) index_pin();
  color([0.16, 0.66, 0.66]) translate([-24.2, 18.85, 57.75]) rotate([90, 0, 0]) pin_washer();
  color([0.85, 0.48, 0.18]) translate([-24.2, 26.1, 57.75]) rotate([90, 0, 0]) lock_nut();
  color([0.55, 0.60, 0.65]) translate([33, -16.8, 8.25]) rotate([0, 0, 0]) guide_bush_a();
  color([0.75, 0.30, 0.55]) translate([33, 16.8, 8.25]) rotate([0, 0, 0]) guide_bush_b();
}

assembly();
